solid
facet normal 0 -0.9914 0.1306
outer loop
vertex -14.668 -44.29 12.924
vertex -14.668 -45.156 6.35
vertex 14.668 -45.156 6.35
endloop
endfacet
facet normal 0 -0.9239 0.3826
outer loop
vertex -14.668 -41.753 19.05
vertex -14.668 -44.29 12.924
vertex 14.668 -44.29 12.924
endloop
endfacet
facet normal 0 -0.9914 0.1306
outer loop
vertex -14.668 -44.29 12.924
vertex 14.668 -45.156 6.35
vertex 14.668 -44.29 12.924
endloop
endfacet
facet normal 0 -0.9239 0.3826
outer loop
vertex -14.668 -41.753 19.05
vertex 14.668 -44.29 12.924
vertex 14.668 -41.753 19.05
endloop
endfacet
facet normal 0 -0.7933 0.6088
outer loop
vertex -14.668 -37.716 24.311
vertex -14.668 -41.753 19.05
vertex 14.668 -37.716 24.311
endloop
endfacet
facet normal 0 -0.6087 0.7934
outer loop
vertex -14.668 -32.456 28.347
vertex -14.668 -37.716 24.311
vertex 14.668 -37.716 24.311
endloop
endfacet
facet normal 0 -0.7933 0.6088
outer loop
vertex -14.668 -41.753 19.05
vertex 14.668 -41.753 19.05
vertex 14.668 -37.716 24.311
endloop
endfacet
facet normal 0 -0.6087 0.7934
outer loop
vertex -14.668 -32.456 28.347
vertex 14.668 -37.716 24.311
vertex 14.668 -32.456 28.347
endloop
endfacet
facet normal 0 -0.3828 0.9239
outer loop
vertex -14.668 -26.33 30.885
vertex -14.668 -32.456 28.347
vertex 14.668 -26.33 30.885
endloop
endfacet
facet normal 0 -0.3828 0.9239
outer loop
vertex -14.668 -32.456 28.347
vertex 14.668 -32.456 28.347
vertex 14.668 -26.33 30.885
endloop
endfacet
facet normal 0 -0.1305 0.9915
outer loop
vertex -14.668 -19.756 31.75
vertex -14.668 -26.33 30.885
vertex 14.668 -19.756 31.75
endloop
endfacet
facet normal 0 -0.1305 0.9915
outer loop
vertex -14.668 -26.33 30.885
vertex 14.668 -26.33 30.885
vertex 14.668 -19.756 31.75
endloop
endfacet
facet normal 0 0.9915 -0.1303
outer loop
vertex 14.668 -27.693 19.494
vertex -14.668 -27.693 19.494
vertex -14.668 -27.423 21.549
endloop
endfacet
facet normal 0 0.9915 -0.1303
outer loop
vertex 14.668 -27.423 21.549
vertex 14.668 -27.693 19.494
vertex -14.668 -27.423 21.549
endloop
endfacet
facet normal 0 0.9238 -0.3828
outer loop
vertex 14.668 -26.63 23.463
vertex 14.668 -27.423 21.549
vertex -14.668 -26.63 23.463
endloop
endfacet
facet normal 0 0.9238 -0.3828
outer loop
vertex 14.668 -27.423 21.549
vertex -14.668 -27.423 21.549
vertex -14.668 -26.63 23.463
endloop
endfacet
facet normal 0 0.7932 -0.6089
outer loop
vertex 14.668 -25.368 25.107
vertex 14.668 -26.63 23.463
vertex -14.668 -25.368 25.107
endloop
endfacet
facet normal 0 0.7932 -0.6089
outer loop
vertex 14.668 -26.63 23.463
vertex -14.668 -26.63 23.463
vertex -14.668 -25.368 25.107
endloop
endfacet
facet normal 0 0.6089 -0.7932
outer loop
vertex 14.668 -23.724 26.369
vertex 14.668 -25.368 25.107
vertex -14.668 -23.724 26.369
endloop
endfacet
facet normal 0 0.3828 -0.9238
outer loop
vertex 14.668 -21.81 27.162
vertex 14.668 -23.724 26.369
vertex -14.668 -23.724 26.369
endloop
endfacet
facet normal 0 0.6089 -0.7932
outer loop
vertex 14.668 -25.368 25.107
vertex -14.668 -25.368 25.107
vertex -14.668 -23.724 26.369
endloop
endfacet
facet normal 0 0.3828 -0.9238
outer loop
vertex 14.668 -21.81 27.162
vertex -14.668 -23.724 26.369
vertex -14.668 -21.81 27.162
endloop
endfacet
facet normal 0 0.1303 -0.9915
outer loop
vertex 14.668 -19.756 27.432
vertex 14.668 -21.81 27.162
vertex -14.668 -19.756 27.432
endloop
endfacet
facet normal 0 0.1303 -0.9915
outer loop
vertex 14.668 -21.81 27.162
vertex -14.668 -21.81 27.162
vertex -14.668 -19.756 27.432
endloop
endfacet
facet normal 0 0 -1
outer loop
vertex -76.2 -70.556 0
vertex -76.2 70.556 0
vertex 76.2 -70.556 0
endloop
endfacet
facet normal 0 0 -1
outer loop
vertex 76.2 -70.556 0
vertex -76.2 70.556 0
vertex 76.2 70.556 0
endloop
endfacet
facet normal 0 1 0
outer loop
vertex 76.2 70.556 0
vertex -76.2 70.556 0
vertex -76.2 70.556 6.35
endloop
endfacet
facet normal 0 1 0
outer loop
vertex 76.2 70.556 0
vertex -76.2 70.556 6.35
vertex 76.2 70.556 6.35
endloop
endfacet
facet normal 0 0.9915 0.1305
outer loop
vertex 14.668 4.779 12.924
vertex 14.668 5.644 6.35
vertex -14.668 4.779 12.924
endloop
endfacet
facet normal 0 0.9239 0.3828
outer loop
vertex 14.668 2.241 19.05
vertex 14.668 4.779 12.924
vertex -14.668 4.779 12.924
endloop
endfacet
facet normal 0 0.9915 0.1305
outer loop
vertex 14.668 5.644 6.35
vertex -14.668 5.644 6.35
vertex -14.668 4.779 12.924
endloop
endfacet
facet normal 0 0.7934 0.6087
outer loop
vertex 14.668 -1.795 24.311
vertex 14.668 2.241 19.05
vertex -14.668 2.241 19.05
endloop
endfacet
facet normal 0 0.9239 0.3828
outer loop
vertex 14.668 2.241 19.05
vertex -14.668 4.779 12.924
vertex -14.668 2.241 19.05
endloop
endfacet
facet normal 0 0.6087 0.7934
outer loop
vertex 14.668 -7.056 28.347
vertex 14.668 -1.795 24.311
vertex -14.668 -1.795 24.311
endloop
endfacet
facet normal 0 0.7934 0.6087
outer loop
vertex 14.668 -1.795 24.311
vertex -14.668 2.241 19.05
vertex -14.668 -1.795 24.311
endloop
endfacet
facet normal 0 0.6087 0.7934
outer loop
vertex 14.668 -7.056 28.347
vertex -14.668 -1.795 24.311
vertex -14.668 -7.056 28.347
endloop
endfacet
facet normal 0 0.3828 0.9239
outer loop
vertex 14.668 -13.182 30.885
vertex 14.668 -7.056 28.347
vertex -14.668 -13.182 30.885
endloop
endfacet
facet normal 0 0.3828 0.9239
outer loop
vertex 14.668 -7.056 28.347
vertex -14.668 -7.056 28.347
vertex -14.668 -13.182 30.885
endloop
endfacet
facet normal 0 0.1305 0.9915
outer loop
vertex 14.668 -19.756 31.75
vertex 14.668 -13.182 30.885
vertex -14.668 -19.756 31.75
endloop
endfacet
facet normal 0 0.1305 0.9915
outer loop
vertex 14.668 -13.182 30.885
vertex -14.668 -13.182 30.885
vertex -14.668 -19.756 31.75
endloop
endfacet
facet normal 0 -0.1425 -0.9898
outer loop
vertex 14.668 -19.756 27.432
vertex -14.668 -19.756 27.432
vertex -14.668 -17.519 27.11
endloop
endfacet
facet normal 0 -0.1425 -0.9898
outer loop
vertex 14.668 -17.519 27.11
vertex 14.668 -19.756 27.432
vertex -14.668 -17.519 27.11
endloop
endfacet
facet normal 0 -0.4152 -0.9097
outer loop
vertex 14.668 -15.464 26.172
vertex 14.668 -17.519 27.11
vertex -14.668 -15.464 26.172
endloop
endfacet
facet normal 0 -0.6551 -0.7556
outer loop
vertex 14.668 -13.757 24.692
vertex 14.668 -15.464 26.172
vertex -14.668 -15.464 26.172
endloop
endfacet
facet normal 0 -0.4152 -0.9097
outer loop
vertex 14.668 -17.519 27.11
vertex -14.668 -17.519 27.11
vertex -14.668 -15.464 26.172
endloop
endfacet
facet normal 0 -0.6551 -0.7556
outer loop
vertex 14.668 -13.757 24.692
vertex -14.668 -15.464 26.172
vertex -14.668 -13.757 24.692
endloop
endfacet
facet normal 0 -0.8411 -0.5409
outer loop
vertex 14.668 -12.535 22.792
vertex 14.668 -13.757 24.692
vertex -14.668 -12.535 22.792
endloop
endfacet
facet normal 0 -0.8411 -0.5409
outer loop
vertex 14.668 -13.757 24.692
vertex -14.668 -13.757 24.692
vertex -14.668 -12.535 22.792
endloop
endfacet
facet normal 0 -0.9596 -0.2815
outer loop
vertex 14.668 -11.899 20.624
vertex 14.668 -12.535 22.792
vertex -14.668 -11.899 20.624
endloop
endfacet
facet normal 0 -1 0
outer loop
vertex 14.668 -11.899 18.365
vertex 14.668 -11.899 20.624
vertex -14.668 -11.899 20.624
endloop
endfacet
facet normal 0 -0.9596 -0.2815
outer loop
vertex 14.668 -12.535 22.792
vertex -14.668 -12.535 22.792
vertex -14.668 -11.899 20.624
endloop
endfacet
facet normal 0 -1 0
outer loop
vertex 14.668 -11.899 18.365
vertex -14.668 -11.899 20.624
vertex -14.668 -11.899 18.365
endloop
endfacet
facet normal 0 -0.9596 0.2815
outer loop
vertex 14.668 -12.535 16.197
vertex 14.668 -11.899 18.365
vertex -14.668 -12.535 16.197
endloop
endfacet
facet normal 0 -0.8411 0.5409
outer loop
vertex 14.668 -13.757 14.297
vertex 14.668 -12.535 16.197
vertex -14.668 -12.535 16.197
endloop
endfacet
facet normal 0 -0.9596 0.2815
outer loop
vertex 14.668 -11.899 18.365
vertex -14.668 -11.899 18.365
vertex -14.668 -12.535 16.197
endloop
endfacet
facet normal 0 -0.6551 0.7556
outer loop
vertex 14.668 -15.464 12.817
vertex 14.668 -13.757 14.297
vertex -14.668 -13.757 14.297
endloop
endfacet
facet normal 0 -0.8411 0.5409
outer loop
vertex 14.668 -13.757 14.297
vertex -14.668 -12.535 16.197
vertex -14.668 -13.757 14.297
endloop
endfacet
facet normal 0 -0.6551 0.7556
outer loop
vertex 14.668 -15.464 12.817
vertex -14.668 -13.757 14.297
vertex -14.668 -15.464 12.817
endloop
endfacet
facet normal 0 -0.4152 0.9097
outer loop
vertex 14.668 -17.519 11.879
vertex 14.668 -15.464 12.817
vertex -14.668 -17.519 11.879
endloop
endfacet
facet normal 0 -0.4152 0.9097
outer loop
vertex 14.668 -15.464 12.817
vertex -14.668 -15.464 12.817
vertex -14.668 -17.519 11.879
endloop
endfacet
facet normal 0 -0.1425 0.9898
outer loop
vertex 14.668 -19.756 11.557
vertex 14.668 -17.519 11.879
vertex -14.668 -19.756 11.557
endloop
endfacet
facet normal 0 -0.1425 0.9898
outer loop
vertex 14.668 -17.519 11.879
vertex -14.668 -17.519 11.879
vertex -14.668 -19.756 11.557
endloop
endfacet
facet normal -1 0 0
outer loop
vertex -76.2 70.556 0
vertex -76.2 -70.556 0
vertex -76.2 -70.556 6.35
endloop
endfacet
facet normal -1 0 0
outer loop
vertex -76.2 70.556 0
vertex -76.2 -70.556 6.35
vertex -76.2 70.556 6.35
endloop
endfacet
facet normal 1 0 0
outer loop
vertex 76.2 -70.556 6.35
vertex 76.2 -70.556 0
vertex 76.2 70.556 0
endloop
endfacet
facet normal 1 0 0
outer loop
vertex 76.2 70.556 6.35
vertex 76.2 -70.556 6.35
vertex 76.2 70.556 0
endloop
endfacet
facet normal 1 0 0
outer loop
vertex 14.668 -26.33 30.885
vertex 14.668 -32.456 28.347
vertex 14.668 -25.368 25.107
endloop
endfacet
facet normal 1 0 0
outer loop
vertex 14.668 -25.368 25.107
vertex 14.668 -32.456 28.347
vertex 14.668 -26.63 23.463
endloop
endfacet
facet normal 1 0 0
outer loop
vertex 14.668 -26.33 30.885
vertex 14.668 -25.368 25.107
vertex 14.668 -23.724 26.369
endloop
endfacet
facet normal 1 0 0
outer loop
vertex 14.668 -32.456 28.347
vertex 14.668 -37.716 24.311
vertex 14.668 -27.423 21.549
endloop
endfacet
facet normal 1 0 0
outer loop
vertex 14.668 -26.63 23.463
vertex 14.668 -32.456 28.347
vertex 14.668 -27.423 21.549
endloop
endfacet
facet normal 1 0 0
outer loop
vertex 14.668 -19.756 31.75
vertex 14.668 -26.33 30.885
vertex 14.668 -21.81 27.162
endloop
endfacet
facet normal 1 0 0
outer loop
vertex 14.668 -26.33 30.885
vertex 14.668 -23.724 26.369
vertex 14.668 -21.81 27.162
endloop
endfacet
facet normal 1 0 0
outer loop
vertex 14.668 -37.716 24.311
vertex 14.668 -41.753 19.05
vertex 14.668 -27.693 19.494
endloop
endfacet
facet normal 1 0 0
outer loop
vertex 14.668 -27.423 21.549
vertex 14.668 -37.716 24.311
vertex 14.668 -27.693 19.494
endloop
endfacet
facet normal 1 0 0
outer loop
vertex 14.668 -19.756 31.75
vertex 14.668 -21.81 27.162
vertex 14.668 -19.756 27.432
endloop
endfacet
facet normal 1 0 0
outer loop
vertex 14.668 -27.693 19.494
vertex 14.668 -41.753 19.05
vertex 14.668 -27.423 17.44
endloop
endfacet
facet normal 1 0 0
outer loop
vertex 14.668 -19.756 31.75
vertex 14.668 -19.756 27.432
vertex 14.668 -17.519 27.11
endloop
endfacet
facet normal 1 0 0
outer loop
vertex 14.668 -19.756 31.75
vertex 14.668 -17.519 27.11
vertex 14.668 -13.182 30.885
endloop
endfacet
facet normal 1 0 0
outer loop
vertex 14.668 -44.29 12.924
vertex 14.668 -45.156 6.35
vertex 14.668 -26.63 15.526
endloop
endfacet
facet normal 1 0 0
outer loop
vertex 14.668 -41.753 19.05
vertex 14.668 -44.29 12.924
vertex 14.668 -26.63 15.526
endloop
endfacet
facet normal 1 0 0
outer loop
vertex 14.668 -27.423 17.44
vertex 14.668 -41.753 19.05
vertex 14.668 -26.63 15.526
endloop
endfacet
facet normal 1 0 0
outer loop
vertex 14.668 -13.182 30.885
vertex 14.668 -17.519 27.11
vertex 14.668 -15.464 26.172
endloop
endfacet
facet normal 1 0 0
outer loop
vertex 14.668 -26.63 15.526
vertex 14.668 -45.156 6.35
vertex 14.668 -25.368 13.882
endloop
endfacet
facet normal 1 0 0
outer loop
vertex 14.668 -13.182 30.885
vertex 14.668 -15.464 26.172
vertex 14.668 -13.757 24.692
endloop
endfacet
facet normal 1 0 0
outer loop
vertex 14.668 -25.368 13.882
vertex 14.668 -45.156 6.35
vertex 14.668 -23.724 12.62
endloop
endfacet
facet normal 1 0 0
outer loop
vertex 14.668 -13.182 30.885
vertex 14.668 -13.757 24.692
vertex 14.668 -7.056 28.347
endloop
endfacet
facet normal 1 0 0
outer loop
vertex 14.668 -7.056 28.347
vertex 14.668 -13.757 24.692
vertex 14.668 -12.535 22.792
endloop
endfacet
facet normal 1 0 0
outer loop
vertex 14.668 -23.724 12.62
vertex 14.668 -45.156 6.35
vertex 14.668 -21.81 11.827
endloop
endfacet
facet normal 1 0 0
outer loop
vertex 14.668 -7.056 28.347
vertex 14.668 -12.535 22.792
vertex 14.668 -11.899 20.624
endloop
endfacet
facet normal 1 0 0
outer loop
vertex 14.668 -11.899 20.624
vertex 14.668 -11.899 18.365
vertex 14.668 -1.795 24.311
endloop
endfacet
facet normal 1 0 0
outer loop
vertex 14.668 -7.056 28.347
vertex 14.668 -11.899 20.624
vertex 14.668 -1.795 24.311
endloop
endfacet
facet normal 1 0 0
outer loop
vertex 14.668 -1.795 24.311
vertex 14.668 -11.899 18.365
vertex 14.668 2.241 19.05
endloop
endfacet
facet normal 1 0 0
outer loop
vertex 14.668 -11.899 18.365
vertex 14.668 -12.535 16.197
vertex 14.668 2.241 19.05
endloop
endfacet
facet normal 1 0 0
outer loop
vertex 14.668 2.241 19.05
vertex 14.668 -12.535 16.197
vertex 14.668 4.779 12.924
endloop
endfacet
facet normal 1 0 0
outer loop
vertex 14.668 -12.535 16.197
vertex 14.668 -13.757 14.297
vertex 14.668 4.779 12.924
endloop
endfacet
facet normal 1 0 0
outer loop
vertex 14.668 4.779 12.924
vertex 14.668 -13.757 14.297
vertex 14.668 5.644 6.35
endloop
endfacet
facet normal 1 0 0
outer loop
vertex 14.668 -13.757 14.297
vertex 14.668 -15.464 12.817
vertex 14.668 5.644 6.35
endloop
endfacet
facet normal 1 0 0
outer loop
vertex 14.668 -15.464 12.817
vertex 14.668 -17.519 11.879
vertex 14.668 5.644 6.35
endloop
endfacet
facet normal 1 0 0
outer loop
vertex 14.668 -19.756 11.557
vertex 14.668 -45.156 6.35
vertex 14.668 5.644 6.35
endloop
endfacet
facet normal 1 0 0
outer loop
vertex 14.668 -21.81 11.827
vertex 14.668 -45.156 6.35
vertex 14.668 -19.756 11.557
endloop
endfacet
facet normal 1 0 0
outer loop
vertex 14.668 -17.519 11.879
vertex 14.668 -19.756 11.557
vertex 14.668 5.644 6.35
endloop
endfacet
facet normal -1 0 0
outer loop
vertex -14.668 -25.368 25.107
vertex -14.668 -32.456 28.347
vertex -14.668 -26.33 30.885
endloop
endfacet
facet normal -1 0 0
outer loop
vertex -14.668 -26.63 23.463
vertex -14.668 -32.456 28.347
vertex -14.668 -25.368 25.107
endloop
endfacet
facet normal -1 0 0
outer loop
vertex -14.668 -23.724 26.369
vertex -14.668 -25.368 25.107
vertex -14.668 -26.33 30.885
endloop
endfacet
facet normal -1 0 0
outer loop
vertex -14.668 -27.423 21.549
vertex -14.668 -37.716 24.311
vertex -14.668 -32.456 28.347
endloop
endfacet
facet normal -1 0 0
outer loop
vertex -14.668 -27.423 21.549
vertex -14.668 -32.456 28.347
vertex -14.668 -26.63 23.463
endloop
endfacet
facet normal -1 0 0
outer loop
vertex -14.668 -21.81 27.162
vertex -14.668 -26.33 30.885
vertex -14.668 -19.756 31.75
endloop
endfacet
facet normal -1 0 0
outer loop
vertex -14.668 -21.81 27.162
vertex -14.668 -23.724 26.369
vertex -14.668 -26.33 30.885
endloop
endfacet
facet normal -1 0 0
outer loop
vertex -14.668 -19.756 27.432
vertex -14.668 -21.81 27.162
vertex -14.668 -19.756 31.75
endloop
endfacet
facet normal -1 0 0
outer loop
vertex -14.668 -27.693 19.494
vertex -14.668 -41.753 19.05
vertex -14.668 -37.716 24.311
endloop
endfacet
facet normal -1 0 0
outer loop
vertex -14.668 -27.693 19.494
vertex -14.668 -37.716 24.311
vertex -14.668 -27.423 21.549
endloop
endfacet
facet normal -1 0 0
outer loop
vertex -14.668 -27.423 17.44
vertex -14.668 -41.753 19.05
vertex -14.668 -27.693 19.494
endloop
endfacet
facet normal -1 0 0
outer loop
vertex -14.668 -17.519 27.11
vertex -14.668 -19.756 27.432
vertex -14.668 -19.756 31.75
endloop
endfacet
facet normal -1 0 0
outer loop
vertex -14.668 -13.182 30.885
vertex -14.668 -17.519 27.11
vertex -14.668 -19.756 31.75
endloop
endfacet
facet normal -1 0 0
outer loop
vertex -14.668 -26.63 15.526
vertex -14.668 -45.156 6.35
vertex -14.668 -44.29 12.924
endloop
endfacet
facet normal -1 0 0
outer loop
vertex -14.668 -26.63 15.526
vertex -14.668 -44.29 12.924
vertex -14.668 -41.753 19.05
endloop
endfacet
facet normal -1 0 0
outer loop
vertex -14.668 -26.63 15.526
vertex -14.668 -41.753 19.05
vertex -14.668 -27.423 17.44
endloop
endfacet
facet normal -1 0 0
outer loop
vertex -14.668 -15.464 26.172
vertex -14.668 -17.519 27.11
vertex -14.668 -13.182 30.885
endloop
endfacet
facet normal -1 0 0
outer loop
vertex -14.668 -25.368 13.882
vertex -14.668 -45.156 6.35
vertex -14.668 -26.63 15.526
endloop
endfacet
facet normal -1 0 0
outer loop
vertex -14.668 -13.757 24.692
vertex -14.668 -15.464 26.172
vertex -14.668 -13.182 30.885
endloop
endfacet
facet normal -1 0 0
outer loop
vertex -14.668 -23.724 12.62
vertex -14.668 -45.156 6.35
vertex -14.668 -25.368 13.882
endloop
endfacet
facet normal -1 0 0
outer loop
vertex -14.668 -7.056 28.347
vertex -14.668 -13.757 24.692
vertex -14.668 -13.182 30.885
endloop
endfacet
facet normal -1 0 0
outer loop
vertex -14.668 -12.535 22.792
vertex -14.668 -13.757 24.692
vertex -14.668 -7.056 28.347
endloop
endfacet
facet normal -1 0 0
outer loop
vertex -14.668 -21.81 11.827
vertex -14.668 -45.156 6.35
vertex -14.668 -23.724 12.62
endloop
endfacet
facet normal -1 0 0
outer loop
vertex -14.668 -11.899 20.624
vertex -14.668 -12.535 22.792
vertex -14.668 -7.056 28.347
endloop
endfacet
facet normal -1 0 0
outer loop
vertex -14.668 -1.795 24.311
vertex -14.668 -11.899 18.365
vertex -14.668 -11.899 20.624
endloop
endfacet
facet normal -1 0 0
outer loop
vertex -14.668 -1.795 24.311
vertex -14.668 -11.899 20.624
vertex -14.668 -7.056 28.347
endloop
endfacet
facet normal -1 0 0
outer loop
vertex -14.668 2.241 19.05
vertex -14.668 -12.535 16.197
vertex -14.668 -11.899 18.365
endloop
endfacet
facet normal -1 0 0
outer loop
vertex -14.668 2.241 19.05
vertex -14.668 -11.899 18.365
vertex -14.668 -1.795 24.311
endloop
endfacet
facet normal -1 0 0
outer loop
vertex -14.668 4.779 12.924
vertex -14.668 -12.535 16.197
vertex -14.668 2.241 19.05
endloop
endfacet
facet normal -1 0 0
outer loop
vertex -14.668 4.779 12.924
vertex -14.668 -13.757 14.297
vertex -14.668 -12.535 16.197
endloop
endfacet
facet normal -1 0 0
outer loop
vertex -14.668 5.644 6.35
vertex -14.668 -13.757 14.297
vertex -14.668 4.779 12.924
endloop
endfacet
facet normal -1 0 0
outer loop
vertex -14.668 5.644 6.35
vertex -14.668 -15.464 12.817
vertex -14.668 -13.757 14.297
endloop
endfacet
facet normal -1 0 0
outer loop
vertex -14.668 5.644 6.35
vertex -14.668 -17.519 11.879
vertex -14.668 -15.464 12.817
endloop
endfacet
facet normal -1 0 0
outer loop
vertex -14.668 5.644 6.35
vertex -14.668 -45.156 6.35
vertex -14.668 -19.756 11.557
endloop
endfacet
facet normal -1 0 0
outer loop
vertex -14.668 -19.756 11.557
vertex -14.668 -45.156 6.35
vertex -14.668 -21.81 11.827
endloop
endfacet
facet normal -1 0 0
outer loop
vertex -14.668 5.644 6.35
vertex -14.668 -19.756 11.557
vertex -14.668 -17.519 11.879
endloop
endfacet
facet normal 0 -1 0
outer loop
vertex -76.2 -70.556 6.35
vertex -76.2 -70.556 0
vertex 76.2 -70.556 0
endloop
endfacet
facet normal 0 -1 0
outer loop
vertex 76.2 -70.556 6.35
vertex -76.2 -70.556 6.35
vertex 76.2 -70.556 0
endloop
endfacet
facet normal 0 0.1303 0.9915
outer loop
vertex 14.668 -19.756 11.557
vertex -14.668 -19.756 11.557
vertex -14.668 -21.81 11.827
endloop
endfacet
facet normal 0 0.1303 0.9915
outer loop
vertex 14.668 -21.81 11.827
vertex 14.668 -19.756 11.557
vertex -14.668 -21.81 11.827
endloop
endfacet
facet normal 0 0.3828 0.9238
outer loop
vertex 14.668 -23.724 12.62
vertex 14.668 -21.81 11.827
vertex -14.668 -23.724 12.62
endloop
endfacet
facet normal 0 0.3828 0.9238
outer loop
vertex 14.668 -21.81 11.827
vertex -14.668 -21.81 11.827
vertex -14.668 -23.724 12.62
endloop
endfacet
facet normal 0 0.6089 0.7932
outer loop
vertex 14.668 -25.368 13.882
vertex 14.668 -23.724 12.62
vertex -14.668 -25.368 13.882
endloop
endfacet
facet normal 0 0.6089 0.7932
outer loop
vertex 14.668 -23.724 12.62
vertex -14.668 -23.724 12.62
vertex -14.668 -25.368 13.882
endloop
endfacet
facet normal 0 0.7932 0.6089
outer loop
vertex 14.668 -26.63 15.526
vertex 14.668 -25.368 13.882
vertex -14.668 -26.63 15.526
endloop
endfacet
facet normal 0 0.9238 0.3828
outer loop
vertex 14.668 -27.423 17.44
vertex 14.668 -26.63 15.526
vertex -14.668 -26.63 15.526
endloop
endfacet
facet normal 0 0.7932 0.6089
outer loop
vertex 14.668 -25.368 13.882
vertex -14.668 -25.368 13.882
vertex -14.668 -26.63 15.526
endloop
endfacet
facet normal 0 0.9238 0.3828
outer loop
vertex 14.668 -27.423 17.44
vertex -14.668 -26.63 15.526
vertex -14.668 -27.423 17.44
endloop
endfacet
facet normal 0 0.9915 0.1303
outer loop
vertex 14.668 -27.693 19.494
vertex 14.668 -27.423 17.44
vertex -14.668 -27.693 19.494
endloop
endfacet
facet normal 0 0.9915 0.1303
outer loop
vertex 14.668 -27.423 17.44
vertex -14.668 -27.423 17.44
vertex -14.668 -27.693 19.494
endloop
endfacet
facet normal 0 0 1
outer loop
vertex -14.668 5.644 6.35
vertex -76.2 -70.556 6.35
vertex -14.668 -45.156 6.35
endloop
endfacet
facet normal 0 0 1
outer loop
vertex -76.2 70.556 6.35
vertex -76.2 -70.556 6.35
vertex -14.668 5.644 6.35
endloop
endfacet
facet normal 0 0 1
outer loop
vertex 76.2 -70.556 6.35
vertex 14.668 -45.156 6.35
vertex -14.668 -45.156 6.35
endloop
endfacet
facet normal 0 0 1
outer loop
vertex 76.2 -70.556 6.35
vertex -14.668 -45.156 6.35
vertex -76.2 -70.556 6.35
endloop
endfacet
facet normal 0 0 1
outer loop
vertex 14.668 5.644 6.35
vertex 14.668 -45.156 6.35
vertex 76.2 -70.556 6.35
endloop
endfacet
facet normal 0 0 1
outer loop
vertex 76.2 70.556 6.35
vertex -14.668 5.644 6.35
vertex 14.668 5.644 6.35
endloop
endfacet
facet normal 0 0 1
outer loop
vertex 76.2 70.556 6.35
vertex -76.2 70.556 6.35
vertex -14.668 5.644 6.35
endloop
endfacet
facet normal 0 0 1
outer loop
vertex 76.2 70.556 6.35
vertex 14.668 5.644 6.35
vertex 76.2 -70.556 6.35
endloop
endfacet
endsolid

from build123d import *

# Parameters (mm, degrees)
F0_W     = 152.4
F0_H     = 141.1111171471
F1_DEPTH = 6.35
F2_W     = 14.6685
F2_H     = 50.8
F3_DEPTH = 25.4
F4_R     = 25.39999
F6_DEPTH = 76.2


# Not quite as in the source:
# - a fillet or chamfer is up to 0.001 mm smaller than in the source, because OpenCascade refuses the exact size


with BuildPart() as f1:
    # F0 (on Top) → F1 (new body)
    with BuildSketch(Plane.XY):
        Rectangle(F0_W, F0_H)
    extrude(amount=F1_DEPTH)

    # F2 (on face) → F3 (join)
    with BuildSketch(Plane.XY.offset(6.35)):
        with Locations((-7.33425, -19.7555585735)):
            Rectangle(F2_W, F2_H)
        with Locations((7.33425, -19.7555585735)):
            Rectangle(F2_W, F2_H)
    extrude(amount=F3_DEPTH)

    # F4 (radius 25.4 in the source; OpenCascade refuses exactly that, so slightly less here)
    f4_edges = [f1.edges().sort_by_distance(p)[0] for p in [
        (0, 5.644441, 31.75),
        (0, -45.155559, 31.75),
    ]]
    fillet(f4_edges, radius=F4_R)

    # F5 (on face) → F6 (cut)
    with BuildSketch(Plane(origin=(-14.6685, 0, 0), x_dir=(0, -1, 0), z_dir=(-1, 0, 0))):
        with BuildLine():
            Line((19.7555585735, 11.557), (19.7555585735, 27.432))
            ThreePointArc((19.7555585735, 27.432), (11.8180585735, 19.4945), (19.7555585735, 11.557))
        make_face()
        with BuildLine():
            ThreePointArc((27.6930585735, 19.4945), (25.3682186492, 25.1071600757), (19.7555585735, 27.432))
            Line((19.7555585735, 27.432), (19.7555585735, 11.557))
            ThreePointArc((19.7555585735, 11.557), (25.3682186492, 13.8818399243), (27.6930585735, 19.4945))
        make_face()
    extrude(amount=-F6_DEPTH, mode=Mode.SUBTRACT)


solid = f1.part
